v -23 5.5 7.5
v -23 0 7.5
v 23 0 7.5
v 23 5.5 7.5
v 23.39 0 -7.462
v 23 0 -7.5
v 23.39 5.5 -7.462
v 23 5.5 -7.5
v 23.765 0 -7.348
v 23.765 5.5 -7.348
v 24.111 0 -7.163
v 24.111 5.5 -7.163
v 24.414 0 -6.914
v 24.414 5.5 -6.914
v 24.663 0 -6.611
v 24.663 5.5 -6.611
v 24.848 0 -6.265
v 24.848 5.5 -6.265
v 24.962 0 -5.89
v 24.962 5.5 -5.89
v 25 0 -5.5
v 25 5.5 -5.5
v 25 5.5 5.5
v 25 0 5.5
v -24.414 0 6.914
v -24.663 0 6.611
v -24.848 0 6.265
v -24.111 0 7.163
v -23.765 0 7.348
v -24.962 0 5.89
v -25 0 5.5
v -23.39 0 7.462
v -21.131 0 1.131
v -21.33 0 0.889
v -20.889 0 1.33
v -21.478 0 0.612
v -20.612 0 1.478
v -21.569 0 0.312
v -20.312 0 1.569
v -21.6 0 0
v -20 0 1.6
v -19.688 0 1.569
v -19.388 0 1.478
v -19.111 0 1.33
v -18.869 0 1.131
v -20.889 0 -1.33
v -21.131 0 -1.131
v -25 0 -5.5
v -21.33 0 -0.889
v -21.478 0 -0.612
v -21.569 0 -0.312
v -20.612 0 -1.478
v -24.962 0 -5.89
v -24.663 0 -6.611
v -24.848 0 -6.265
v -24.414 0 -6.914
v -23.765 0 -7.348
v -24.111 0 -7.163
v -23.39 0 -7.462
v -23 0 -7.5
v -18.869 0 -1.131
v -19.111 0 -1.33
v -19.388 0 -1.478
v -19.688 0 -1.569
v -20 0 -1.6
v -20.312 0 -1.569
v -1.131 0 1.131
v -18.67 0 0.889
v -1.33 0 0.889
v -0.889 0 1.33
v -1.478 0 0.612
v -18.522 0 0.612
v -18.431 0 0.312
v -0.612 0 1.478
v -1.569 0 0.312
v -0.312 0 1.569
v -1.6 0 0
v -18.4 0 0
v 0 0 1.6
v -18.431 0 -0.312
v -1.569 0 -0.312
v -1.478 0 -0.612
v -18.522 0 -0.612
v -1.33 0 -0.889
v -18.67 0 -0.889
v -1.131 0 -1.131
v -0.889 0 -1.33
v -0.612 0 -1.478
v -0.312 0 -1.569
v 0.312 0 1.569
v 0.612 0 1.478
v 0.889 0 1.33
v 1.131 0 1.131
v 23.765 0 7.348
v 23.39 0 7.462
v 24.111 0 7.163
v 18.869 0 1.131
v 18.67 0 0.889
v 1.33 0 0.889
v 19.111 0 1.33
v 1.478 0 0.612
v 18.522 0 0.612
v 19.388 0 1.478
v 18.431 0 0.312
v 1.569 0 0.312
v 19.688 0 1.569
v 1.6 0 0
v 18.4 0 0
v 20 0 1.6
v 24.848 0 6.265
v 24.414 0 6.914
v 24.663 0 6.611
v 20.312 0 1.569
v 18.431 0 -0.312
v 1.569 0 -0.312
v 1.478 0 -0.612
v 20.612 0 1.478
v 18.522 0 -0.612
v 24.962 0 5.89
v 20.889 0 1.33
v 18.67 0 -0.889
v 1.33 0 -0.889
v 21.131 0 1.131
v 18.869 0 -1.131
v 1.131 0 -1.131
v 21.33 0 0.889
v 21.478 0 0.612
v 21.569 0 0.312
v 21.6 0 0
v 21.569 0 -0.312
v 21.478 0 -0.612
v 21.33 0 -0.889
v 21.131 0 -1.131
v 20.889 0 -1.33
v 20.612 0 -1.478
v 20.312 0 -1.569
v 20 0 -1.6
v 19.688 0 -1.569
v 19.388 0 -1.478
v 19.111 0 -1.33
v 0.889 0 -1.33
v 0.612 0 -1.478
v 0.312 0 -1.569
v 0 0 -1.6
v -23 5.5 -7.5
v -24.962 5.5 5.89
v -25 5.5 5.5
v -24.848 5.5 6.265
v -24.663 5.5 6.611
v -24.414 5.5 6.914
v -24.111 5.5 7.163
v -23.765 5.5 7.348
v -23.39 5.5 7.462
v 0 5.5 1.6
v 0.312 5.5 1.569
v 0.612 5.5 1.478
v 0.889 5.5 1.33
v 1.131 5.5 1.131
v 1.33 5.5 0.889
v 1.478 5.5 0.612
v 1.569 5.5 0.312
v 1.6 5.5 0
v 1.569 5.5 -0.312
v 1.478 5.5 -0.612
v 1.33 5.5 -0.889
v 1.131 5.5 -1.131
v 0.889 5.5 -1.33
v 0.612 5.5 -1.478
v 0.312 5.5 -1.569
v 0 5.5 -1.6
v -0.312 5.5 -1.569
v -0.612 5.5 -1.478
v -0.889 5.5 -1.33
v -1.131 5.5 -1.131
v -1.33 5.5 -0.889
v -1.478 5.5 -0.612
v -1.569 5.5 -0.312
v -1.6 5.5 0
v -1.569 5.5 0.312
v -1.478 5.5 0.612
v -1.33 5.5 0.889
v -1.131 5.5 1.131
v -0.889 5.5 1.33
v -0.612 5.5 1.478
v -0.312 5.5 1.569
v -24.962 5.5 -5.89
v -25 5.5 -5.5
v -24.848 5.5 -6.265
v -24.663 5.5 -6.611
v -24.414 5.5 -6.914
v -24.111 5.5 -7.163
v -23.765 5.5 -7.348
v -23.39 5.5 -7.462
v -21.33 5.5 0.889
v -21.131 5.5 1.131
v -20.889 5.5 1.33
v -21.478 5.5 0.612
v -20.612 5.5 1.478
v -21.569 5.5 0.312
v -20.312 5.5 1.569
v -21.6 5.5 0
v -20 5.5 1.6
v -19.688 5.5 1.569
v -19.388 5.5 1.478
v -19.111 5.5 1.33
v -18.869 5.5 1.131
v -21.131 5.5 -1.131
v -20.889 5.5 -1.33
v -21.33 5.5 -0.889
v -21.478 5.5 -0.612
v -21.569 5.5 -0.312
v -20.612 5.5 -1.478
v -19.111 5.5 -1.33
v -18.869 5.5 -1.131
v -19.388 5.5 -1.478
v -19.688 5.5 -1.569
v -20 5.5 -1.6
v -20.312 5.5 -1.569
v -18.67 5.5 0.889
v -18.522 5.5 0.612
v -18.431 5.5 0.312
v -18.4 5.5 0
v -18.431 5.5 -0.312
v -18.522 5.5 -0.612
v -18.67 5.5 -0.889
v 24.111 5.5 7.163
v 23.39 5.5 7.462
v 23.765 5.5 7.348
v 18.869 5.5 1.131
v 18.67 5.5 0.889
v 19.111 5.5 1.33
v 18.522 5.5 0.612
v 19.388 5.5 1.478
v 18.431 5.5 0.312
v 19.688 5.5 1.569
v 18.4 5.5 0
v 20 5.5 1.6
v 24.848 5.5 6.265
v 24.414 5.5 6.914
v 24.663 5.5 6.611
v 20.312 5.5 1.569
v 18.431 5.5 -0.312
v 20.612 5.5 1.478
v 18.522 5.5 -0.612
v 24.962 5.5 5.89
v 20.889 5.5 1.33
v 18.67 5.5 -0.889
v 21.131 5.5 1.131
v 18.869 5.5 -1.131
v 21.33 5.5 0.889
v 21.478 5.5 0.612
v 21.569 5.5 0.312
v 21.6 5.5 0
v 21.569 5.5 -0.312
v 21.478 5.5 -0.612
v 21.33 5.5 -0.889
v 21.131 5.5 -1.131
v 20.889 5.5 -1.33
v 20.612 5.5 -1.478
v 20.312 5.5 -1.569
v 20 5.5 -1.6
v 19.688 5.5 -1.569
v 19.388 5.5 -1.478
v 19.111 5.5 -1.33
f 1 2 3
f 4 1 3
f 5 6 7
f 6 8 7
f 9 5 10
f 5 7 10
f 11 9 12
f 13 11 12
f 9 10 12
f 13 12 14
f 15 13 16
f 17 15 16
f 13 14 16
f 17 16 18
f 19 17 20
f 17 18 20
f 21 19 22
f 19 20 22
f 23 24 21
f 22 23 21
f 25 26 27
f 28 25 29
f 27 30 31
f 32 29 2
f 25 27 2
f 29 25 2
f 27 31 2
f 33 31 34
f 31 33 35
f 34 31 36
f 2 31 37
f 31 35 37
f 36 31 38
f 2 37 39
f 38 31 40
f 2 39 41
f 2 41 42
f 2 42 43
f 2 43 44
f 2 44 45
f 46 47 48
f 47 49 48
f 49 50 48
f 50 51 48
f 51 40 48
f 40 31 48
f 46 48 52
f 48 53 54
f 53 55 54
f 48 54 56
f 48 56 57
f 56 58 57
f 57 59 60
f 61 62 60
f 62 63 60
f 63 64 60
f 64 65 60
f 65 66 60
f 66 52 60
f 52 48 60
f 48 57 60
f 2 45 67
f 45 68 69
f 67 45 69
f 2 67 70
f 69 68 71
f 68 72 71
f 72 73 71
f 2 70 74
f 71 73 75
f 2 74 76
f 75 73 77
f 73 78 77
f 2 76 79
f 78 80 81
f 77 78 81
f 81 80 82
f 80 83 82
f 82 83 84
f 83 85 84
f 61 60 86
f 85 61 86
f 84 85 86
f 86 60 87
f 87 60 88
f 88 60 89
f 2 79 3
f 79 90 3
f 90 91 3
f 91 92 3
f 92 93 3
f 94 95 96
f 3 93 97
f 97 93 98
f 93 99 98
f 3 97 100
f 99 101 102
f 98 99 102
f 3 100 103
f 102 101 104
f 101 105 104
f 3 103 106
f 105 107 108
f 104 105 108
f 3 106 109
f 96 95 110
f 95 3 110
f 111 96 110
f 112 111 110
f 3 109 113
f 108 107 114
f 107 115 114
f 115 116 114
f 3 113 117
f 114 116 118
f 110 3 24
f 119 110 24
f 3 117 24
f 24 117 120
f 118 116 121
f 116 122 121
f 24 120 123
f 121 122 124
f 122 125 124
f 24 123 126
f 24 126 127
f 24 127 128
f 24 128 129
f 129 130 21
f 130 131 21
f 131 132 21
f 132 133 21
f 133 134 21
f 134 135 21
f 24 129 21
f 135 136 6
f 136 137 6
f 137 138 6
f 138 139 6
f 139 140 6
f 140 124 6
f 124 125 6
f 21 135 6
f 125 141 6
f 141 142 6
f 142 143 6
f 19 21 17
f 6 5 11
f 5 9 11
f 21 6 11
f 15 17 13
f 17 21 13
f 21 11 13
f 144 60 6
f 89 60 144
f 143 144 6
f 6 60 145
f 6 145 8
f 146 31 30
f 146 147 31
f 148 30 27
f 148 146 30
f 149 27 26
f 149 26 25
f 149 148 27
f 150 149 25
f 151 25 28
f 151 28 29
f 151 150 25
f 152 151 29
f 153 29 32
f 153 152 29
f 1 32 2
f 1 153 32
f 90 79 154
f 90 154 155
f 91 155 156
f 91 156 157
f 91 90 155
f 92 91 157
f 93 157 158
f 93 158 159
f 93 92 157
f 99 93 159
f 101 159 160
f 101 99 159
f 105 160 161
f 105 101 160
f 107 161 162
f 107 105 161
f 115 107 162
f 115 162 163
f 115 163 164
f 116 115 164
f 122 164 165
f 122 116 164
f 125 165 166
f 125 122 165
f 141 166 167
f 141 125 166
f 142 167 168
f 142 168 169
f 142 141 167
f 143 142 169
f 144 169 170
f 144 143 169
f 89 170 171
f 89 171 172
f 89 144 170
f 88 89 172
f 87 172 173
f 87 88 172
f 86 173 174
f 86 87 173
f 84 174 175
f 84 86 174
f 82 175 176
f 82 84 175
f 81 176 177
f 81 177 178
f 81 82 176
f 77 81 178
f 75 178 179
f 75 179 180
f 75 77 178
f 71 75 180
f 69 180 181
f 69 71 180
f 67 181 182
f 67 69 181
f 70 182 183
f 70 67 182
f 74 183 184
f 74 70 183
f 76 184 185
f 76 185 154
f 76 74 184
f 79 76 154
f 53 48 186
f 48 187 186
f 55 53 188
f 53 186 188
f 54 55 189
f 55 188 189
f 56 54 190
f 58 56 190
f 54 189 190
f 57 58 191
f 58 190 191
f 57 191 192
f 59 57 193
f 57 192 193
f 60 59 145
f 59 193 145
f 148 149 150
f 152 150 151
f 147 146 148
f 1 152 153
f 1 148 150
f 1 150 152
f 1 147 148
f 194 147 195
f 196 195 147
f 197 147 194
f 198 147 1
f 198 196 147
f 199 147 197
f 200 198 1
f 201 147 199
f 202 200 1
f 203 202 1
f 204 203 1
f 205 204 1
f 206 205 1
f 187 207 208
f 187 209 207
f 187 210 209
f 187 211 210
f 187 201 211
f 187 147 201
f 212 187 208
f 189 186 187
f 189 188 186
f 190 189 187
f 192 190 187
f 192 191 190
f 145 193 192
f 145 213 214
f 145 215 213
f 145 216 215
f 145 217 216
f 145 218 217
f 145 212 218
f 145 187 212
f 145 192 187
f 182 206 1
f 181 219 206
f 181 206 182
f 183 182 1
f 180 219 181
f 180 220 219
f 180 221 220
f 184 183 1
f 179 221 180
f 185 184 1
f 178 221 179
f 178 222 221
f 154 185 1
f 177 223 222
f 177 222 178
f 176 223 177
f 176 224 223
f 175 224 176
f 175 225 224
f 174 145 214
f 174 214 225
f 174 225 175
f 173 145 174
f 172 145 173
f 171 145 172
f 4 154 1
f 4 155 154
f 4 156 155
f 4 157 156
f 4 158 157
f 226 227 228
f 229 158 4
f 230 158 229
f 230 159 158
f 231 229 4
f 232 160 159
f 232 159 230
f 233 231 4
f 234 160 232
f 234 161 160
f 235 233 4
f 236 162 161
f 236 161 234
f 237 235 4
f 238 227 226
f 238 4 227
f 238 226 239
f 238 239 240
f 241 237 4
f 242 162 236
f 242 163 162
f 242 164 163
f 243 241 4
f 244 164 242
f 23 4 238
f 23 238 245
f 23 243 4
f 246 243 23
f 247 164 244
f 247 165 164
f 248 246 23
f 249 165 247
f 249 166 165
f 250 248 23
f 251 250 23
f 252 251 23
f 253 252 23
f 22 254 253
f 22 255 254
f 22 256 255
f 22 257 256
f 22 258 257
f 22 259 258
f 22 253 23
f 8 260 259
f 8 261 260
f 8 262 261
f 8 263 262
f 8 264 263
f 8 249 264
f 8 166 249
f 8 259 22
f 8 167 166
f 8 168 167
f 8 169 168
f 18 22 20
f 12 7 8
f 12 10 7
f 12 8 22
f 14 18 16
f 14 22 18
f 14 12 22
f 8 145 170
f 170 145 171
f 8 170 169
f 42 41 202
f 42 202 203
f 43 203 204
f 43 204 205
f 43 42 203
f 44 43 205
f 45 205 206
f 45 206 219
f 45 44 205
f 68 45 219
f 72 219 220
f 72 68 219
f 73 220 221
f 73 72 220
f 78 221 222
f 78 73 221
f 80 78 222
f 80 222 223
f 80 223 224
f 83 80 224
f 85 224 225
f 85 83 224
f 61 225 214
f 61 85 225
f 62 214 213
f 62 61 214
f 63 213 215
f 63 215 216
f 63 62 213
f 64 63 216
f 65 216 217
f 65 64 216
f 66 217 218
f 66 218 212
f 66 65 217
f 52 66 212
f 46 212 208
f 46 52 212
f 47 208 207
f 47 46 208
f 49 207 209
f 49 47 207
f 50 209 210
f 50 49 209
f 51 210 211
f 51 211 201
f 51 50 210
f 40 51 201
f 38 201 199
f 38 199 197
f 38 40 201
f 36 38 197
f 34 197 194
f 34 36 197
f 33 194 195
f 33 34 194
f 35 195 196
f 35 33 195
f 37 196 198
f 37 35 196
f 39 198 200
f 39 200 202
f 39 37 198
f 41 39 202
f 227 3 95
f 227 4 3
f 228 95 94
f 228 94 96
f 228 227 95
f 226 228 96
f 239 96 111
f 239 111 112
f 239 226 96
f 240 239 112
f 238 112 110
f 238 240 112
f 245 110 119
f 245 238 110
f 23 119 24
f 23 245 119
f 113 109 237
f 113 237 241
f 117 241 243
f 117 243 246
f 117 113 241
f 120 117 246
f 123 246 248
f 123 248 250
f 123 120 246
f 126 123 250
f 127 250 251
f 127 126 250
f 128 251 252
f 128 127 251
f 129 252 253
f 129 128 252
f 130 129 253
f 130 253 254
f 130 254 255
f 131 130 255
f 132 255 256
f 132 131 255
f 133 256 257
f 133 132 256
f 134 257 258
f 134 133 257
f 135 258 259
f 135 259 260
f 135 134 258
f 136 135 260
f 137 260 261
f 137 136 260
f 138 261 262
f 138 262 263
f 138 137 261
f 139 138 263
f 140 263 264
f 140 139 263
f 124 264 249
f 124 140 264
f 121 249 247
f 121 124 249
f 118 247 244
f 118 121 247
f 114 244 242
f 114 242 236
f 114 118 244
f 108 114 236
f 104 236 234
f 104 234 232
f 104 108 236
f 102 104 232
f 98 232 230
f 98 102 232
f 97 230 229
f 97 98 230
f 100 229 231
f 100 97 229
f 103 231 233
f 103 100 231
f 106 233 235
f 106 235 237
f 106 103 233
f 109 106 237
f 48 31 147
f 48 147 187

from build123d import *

# Parameters (mm, degrees)
SKETCH_1_W      = 50
SKETCH_1_H      = 15
SKETCH_1_R      = 1.6
EXTRUDE_1_DEPTH = 5.5
FILLET_1_R      = 2


with BuildPart() as part:
    # 草图1 → 凸台-拉伸1 (new body)
    with BuildSketch(Plane(origin=(0, 0, 0), x_dir=(1, 0, 0), z_dir=(0, 1, 0))):
        Rectangle(SKETCH_1_W, SKETCH_1_H)
        with Locations(Location((-20, 0, 0), (0, 0, 270))):
            Circle(SKETCH_1_R, mode=Mode.SUBTRACT)
        with Locations(Location((0, 0, 0), (0, 0, 270))):
            Circle(SKETCH_1_R, mode=Mode.SUBTRACT)
        with Locations(Location((20, 0, 0), (0, 0, 270))):
            Circle(SKETCH_1_R, mode=Mode.SUBTRACT)
    extrude(amount=EXTRUDE_1_DEPTH)

    # 圆角1
    fillet_1_edges = [part.edges().sort_by_distance(p)[0] for p in [
        (25, 2.75, 7.5),
        (-25, 2.75, 7.5),
        (-25, 2.75, -7.5),
        (25, 2.75, -7.5),
    ]]
    fillet(fillet_1_edges, radius=FILLET_1_R)


solid = part.part
